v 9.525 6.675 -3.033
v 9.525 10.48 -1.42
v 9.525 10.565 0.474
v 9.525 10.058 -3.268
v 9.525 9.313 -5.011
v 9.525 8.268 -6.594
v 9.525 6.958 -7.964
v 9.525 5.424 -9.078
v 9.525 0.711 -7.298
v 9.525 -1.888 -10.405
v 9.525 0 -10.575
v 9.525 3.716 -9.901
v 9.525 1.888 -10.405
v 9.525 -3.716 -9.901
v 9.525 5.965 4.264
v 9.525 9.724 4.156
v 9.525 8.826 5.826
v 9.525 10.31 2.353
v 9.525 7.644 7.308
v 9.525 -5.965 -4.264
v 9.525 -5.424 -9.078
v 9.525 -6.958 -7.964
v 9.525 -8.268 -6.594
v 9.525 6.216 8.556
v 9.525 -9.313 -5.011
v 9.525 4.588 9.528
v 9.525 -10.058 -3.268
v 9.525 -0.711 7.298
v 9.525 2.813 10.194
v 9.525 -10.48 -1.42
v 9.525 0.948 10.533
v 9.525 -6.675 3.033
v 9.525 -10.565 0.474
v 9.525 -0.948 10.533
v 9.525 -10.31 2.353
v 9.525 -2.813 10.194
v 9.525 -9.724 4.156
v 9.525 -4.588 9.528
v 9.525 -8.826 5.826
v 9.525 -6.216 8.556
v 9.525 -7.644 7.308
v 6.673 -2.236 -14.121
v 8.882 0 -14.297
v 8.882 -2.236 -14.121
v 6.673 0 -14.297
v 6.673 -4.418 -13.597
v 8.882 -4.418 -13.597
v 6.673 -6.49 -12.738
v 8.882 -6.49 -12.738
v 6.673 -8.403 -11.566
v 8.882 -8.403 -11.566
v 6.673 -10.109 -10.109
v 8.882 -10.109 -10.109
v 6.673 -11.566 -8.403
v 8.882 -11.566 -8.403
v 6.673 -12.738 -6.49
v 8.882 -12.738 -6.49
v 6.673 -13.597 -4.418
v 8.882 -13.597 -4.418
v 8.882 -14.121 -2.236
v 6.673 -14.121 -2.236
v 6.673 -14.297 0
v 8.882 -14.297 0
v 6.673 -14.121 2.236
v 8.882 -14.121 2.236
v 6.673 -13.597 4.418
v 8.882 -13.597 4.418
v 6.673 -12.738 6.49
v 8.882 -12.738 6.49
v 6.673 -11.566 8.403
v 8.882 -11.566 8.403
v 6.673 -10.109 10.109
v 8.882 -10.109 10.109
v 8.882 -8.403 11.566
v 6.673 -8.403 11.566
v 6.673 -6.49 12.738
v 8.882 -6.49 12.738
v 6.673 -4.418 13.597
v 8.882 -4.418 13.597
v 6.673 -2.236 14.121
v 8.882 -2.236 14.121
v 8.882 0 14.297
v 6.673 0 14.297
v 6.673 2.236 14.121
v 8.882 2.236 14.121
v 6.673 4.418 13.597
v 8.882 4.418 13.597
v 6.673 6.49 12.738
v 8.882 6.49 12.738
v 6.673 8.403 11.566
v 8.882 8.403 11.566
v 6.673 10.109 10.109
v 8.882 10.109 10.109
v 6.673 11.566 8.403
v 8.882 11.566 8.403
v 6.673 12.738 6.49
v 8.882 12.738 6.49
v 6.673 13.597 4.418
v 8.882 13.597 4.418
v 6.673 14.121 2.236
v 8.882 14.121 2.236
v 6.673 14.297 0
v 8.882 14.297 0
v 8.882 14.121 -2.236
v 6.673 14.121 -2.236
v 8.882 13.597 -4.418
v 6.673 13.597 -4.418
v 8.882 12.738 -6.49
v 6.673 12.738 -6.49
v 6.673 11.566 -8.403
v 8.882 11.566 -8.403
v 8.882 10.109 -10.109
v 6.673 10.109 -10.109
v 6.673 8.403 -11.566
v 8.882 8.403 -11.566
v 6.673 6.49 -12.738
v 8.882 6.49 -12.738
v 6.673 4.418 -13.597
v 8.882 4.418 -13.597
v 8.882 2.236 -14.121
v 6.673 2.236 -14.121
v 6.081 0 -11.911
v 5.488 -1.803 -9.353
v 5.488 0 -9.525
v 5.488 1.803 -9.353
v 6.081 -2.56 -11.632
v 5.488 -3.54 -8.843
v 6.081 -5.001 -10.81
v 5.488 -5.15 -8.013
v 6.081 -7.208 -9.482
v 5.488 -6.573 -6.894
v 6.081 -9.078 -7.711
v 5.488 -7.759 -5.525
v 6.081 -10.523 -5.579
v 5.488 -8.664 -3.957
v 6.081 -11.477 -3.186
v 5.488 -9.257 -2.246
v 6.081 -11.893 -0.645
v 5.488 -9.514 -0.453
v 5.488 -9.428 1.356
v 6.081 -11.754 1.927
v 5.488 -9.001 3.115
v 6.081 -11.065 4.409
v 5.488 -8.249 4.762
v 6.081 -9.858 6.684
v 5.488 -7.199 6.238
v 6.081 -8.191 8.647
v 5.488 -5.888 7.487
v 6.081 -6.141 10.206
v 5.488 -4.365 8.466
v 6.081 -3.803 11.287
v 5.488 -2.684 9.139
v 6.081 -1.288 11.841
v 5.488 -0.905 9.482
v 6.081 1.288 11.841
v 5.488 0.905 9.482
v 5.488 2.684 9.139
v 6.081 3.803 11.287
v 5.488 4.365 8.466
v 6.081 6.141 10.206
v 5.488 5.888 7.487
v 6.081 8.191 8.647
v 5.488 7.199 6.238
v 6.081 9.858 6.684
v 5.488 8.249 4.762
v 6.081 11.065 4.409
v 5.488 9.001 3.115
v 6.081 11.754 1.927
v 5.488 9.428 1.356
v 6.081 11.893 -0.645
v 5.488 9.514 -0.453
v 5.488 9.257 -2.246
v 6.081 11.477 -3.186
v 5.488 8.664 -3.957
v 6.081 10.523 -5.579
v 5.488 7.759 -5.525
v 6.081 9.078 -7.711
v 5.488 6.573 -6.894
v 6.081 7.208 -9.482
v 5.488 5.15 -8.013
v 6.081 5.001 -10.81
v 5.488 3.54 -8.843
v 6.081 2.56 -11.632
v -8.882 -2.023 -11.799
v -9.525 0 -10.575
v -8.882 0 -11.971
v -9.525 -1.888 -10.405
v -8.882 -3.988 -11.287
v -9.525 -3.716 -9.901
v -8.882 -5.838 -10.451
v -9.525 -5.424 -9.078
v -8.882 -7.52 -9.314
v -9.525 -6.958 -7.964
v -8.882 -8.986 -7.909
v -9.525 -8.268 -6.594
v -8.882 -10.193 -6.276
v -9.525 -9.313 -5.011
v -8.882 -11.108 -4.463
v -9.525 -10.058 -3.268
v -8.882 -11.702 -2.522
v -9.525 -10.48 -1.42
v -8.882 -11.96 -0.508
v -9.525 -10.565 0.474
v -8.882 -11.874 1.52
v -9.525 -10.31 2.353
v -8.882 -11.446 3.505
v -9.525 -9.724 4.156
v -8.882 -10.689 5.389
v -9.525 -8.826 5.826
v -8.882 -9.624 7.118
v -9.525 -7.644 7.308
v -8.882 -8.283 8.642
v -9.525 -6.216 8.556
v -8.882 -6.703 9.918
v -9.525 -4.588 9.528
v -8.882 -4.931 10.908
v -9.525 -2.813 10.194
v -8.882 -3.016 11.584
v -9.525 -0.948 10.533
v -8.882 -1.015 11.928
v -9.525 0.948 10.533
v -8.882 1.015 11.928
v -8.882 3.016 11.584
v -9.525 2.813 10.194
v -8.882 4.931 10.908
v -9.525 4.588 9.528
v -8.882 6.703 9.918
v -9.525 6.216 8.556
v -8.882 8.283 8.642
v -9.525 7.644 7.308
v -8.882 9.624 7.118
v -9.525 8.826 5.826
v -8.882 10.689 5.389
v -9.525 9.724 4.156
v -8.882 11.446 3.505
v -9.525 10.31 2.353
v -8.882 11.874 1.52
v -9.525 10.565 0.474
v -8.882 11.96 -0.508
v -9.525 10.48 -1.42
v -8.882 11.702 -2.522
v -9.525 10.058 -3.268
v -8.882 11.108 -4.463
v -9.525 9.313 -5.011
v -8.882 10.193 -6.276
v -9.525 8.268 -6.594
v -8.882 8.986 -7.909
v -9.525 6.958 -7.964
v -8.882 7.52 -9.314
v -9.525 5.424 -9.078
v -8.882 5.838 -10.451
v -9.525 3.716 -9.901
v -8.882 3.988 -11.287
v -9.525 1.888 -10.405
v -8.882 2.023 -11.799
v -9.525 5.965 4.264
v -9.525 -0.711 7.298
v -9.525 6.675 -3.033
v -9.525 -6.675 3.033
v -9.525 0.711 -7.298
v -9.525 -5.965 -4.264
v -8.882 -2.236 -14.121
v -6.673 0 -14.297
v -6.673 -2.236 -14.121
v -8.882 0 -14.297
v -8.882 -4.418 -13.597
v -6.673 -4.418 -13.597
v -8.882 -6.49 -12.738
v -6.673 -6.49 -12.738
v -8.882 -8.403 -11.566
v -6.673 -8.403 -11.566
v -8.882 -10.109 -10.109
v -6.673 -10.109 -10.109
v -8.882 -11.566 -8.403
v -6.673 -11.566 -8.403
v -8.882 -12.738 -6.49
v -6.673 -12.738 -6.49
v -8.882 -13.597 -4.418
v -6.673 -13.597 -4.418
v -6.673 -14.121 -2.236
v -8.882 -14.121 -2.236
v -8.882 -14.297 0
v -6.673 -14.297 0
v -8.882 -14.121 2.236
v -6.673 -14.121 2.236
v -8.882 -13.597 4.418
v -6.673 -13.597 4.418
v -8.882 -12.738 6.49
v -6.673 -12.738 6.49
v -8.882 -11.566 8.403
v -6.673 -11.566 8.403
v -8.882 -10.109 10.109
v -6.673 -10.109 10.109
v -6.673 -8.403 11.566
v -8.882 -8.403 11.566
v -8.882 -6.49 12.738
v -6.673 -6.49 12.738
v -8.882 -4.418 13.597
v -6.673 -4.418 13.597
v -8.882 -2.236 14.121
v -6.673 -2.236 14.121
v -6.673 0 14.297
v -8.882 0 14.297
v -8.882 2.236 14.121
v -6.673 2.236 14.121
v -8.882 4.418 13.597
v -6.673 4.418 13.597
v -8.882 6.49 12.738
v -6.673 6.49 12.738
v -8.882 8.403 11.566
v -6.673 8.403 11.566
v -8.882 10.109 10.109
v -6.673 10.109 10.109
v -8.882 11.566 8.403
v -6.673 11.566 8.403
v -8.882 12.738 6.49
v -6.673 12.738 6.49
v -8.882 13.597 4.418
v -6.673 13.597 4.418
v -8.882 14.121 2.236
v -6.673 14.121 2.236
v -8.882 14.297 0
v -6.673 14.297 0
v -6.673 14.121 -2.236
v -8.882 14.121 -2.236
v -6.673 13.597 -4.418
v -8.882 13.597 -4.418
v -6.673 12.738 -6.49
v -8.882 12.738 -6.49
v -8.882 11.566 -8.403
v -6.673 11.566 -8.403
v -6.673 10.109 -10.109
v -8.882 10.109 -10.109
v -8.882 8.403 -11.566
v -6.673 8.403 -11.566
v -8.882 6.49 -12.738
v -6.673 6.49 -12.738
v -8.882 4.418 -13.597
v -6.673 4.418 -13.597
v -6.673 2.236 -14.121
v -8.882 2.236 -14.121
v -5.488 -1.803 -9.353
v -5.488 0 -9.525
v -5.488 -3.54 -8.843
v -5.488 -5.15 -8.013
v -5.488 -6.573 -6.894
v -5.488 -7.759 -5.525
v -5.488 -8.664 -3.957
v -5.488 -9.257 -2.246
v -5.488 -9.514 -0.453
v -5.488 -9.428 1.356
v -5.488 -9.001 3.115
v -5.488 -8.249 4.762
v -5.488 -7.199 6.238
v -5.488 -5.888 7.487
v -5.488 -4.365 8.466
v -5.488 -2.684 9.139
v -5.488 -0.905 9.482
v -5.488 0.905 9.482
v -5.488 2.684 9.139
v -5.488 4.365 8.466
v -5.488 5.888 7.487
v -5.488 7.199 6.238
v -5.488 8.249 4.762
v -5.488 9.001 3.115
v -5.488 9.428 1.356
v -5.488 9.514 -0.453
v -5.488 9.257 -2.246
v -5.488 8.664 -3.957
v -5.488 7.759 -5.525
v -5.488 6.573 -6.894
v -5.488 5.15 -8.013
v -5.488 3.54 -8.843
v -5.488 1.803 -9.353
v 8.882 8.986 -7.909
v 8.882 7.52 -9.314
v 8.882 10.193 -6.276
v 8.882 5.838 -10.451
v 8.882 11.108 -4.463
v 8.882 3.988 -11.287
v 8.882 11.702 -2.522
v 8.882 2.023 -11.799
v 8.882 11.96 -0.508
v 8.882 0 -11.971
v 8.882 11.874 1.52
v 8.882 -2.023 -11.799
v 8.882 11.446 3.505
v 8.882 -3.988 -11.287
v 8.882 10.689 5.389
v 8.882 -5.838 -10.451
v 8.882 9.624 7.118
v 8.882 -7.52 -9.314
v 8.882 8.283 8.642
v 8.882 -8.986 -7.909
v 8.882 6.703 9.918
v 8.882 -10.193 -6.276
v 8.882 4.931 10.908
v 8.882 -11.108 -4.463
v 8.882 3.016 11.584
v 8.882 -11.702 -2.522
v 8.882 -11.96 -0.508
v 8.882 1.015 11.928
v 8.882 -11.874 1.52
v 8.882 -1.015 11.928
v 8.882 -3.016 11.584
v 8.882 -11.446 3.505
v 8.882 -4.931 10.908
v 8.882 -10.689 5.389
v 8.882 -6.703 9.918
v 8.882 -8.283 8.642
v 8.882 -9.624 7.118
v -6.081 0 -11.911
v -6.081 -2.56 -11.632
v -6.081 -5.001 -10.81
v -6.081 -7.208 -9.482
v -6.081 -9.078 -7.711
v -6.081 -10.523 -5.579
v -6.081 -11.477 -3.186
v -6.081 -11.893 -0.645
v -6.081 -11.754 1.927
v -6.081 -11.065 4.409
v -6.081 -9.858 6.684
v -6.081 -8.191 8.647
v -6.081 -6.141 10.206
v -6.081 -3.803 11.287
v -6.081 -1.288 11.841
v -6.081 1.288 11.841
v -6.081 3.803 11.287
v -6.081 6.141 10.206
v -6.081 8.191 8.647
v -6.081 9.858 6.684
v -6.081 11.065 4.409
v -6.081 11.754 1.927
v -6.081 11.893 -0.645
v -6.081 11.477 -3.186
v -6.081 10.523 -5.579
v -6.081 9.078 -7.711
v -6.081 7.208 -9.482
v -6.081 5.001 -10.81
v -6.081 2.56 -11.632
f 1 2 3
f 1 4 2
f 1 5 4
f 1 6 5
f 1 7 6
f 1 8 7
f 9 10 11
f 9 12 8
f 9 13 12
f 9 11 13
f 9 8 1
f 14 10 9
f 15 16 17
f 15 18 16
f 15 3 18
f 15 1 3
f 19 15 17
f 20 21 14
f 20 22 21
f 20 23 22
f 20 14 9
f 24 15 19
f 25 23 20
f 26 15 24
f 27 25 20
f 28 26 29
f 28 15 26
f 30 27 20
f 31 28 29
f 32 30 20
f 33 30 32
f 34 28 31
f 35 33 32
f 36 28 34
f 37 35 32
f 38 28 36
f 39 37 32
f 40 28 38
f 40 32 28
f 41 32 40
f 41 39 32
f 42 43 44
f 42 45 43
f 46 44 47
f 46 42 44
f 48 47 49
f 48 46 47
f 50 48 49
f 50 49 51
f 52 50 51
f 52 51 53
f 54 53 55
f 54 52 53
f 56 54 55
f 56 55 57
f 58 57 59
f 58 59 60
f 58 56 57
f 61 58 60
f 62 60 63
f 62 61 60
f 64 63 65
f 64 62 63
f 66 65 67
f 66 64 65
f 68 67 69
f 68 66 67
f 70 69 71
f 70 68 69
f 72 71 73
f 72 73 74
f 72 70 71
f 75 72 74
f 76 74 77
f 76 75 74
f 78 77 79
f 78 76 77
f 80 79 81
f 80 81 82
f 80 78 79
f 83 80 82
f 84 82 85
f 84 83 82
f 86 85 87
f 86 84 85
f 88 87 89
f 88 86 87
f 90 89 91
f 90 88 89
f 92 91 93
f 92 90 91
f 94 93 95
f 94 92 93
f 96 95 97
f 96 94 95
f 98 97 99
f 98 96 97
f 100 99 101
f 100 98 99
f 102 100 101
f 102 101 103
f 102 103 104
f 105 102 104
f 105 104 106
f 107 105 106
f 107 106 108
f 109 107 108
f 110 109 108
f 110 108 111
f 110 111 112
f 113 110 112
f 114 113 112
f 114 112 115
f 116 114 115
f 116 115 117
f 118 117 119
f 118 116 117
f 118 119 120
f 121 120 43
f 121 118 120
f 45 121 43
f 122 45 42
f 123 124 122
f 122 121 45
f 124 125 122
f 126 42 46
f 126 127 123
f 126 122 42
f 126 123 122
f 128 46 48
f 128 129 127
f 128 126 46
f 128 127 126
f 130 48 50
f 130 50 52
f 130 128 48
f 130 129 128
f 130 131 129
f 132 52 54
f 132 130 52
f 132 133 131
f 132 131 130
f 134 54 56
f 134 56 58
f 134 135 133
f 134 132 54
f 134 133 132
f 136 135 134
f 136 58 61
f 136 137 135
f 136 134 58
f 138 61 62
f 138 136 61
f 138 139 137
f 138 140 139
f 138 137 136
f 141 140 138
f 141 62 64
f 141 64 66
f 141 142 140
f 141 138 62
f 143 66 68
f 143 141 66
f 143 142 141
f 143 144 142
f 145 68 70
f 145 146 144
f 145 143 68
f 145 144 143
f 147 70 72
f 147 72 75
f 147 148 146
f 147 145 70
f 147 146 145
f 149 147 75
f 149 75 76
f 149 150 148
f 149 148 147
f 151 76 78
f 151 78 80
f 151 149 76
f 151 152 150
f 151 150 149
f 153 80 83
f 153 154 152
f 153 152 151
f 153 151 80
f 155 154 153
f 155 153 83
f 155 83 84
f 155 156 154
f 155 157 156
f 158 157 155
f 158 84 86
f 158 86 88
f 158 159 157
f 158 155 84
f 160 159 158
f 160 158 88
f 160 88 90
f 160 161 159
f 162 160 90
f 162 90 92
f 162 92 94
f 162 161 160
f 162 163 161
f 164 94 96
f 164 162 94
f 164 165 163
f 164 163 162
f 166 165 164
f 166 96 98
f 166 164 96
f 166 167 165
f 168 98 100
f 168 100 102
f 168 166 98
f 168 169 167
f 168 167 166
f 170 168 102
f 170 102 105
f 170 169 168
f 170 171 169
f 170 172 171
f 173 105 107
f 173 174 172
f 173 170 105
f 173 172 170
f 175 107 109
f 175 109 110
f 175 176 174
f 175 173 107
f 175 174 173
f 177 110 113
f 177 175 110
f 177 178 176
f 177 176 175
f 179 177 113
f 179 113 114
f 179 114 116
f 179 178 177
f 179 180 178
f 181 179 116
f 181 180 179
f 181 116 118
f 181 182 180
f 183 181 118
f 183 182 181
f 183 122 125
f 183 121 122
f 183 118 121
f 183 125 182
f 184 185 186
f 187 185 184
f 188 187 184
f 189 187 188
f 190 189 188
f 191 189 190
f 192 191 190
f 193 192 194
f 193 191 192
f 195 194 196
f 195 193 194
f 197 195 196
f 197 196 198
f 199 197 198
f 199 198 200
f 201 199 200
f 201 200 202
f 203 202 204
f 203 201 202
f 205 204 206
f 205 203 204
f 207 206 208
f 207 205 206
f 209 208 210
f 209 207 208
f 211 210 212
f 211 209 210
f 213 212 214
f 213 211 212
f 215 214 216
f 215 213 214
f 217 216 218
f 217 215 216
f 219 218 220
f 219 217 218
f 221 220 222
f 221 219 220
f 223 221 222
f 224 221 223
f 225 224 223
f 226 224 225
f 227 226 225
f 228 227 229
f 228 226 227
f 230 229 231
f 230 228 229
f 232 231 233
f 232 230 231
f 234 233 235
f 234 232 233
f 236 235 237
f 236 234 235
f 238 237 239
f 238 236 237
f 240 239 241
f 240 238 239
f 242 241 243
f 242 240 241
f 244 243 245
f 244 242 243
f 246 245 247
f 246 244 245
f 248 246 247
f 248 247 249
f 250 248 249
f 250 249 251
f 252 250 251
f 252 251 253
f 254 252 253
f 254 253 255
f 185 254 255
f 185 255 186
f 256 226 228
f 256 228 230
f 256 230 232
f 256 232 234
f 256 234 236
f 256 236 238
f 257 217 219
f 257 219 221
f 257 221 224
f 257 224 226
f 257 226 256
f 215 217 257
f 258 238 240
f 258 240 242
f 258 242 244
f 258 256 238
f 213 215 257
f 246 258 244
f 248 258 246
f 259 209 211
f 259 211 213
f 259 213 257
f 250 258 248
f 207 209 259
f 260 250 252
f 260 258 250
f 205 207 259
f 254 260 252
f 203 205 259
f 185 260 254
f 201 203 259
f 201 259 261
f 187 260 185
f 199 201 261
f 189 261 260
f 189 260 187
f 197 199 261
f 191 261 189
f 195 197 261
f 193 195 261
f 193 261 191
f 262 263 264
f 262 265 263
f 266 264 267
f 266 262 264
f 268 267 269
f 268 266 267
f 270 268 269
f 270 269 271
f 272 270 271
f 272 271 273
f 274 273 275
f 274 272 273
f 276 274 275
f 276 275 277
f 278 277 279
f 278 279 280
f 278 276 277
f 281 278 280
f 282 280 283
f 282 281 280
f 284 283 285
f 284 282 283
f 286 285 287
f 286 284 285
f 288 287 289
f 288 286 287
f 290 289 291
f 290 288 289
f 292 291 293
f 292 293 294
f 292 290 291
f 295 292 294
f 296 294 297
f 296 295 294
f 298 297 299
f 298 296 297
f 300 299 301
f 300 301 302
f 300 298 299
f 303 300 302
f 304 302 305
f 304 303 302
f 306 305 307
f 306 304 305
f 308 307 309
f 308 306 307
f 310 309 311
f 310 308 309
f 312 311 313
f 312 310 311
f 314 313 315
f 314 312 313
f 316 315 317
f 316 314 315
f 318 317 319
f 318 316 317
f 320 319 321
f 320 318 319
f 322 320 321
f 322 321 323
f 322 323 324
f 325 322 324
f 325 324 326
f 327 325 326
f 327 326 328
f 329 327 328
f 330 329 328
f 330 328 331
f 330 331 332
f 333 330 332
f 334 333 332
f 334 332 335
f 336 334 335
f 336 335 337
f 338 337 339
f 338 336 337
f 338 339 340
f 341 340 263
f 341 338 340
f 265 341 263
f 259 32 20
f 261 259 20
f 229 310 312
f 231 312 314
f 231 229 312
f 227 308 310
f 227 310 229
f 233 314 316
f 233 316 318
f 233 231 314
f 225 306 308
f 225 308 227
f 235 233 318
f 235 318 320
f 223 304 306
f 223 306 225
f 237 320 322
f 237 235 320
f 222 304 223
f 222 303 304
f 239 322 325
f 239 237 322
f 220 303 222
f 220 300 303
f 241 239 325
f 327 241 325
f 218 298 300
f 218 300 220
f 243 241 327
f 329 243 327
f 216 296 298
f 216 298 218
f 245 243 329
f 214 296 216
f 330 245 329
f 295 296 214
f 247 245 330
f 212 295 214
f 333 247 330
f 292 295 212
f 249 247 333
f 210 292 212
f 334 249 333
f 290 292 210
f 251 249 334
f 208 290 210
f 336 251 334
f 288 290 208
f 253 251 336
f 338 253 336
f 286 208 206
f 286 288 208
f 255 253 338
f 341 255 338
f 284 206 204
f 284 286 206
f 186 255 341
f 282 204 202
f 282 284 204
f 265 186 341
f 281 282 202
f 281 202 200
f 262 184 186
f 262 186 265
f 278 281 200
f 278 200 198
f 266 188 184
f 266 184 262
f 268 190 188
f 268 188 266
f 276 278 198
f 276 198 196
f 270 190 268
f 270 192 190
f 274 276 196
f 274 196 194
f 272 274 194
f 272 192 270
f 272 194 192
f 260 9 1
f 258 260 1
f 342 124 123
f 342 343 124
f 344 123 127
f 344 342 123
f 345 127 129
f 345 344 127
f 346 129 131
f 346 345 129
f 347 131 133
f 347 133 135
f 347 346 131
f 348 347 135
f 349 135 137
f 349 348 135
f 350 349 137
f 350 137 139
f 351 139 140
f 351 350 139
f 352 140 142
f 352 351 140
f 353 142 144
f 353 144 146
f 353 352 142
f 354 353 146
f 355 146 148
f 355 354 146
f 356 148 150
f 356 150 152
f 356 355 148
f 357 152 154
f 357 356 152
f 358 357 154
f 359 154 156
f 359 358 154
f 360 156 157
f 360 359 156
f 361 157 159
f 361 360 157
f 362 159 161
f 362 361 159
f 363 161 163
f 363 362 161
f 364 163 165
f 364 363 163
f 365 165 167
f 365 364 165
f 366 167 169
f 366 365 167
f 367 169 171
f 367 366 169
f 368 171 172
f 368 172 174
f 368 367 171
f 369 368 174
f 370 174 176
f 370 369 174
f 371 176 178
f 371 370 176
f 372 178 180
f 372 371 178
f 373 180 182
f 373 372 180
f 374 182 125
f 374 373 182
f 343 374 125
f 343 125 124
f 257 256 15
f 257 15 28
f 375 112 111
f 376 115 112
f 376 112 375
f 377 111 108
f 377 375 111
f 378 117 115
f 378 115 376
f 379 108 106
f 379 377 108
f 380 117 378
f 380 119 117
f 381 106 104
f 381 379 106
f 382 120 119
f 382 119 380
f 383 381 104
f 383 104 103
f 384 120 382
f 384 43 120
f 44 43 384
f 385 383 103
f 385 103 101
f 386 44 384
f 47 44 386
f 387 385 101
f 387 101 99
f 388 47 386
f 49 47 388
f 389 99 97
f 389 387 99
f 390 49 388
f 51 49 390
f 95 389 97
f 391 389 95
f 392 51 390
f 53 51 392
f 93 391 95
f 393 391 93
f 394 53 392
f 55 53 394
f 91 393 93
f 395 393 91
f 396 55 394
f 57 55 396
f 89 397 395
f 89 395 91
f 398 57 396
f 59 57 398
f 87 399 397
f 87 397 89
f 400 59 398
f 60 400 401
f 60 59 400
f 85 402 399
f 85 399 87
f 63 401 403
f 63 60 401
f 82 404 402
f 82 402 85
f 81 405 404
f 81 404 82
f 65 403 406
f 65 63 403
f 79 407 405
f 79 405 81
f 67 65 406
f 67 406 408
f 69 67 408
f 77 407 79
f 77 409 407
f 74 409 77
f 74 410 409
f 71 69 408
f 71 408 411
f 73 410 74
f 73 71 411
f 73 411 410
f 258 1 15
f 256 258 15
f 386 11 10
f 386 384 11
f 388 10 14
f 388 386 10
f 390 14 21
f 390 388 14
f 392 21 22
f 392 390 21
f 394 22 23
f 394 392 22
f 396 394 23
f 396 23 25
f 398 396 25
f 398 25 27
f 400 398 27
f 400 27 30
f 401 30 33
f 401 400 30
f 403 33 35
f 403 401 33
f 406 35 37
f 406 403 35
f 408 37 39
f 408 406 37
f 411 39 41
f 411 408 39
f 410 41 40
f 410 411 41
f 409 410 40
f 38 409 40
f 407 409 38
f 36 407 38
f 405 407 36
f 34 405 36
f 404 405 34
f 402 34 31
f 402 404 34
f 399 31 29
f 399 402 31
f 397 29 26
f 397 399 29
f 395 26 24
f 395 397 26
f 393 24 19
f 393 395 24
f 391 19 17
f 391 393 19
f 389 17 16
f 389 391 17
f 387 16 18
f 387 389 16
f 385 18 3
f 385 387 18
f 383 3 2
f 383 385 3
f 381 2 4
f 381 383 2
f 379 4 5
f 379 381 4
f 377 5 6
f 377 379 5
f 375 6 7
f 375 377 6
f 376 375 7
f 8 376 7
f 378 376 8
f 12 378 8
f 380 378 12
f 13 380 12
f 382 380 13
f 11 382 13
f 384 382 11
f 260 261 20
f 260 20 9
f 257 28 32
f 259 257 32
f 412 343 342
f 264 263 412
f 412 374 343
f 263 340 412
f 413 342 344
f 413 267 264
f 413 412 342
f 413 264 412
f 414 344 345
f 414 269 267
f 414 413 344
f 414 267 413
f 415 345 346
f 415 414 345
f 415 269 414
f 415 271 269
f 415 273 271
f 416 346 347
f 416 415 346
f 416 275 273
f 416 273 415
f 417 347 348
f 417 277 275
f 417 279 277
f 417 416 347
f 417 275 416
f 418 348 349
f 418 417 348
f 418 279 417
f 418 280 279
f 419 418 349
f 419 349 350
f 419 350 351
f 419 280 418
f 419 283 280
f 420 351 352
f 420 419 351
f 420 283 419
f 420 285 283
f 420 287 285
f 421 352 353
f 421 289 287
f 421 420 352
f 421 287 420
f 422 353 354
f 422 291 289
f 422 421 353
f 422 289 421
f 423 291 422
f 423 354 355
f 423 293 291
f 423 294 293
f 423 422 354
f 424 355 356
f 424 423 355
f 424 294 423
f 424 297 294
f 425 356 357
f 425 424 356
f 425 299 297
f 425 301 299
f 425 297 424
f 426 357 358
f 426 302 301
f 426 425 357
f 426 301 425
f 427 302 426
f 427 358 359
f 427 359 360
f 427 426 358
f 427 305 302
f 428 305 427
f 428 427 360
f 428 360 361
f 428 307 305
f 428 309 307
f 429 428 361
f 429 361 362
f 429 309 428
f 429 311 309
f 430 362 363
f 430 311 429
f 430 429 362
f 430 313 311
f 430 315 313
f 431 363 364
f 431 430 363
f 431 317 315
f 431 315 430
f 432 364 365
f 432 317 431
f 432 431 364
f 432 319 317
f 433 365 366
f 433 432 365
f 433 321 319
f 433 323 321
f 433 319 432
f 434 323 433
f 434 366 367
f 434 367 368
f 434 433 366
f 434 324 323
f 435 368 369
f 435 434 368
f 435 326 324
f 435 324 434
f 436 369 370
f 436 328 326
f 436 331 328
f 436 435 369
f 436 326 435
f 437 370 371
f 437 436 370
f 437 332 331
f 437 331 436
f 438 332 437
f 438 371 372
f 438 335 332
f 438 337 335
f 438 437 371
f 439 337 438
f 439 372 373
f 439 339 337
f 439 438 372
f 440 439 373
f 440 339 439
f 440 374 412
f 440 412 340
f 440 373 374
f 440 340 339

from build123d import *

# Parameters (mm, degrees)
CUT_EXTRUDE1_DEPTH = 28.77920446


with BuildPart() as part:
    # Sketch2 → Revolve1 (revolve)
    with BuildSketch(Plane.XY, mode=Mode.PRIVATE) as revolve1_sk:
        Polygon((0, 9.525), (0, 0), (9.525, 0), (9.525, 10.575392629), (8.881774662, 11.97073299), (8.881774662, 14.296532804), (6.673429623, 14.296532804), (5.487800488, 9.525), align=None)
        Polygon((-9.525, 0), (0, 0), (0, 9.525), (-5.487800488, 9.525), (-6.673429623, 14.296532804), (-8.881774662, 14.296532804), (-8.881774662, 11.97073299), (-9.525, 10.575392629), align=None)
    revolve(revolve1_sk.sketch.rotate(Axis((14.160671305, 0, 0), (-1, 0, 0)), 90), axis=Axis((14.160671305, 0, 0), (-1, 0, 0)))

    # Sketch3 → Cut-Extrude1 (cut, through all)
    with BuildSketch(Plane(origin=(9.525, 0, 0), x_dir=(0, 0, -1), z_dir=(1, 0, 0))):
        Polygon((4.264354564, -5.964781093), (7.297829236, 0.710648837), (3.033474672, 6.67542993), (-4.264354564, 5.964781093), (-7.297829236, -0.710648837), (-3.033474672, -6.67542993), align=None)
    extrude(amount=-CUT_EXTRUDE1_DEPTH, mode=Mode.SUBTRACT)


solid = part.part
